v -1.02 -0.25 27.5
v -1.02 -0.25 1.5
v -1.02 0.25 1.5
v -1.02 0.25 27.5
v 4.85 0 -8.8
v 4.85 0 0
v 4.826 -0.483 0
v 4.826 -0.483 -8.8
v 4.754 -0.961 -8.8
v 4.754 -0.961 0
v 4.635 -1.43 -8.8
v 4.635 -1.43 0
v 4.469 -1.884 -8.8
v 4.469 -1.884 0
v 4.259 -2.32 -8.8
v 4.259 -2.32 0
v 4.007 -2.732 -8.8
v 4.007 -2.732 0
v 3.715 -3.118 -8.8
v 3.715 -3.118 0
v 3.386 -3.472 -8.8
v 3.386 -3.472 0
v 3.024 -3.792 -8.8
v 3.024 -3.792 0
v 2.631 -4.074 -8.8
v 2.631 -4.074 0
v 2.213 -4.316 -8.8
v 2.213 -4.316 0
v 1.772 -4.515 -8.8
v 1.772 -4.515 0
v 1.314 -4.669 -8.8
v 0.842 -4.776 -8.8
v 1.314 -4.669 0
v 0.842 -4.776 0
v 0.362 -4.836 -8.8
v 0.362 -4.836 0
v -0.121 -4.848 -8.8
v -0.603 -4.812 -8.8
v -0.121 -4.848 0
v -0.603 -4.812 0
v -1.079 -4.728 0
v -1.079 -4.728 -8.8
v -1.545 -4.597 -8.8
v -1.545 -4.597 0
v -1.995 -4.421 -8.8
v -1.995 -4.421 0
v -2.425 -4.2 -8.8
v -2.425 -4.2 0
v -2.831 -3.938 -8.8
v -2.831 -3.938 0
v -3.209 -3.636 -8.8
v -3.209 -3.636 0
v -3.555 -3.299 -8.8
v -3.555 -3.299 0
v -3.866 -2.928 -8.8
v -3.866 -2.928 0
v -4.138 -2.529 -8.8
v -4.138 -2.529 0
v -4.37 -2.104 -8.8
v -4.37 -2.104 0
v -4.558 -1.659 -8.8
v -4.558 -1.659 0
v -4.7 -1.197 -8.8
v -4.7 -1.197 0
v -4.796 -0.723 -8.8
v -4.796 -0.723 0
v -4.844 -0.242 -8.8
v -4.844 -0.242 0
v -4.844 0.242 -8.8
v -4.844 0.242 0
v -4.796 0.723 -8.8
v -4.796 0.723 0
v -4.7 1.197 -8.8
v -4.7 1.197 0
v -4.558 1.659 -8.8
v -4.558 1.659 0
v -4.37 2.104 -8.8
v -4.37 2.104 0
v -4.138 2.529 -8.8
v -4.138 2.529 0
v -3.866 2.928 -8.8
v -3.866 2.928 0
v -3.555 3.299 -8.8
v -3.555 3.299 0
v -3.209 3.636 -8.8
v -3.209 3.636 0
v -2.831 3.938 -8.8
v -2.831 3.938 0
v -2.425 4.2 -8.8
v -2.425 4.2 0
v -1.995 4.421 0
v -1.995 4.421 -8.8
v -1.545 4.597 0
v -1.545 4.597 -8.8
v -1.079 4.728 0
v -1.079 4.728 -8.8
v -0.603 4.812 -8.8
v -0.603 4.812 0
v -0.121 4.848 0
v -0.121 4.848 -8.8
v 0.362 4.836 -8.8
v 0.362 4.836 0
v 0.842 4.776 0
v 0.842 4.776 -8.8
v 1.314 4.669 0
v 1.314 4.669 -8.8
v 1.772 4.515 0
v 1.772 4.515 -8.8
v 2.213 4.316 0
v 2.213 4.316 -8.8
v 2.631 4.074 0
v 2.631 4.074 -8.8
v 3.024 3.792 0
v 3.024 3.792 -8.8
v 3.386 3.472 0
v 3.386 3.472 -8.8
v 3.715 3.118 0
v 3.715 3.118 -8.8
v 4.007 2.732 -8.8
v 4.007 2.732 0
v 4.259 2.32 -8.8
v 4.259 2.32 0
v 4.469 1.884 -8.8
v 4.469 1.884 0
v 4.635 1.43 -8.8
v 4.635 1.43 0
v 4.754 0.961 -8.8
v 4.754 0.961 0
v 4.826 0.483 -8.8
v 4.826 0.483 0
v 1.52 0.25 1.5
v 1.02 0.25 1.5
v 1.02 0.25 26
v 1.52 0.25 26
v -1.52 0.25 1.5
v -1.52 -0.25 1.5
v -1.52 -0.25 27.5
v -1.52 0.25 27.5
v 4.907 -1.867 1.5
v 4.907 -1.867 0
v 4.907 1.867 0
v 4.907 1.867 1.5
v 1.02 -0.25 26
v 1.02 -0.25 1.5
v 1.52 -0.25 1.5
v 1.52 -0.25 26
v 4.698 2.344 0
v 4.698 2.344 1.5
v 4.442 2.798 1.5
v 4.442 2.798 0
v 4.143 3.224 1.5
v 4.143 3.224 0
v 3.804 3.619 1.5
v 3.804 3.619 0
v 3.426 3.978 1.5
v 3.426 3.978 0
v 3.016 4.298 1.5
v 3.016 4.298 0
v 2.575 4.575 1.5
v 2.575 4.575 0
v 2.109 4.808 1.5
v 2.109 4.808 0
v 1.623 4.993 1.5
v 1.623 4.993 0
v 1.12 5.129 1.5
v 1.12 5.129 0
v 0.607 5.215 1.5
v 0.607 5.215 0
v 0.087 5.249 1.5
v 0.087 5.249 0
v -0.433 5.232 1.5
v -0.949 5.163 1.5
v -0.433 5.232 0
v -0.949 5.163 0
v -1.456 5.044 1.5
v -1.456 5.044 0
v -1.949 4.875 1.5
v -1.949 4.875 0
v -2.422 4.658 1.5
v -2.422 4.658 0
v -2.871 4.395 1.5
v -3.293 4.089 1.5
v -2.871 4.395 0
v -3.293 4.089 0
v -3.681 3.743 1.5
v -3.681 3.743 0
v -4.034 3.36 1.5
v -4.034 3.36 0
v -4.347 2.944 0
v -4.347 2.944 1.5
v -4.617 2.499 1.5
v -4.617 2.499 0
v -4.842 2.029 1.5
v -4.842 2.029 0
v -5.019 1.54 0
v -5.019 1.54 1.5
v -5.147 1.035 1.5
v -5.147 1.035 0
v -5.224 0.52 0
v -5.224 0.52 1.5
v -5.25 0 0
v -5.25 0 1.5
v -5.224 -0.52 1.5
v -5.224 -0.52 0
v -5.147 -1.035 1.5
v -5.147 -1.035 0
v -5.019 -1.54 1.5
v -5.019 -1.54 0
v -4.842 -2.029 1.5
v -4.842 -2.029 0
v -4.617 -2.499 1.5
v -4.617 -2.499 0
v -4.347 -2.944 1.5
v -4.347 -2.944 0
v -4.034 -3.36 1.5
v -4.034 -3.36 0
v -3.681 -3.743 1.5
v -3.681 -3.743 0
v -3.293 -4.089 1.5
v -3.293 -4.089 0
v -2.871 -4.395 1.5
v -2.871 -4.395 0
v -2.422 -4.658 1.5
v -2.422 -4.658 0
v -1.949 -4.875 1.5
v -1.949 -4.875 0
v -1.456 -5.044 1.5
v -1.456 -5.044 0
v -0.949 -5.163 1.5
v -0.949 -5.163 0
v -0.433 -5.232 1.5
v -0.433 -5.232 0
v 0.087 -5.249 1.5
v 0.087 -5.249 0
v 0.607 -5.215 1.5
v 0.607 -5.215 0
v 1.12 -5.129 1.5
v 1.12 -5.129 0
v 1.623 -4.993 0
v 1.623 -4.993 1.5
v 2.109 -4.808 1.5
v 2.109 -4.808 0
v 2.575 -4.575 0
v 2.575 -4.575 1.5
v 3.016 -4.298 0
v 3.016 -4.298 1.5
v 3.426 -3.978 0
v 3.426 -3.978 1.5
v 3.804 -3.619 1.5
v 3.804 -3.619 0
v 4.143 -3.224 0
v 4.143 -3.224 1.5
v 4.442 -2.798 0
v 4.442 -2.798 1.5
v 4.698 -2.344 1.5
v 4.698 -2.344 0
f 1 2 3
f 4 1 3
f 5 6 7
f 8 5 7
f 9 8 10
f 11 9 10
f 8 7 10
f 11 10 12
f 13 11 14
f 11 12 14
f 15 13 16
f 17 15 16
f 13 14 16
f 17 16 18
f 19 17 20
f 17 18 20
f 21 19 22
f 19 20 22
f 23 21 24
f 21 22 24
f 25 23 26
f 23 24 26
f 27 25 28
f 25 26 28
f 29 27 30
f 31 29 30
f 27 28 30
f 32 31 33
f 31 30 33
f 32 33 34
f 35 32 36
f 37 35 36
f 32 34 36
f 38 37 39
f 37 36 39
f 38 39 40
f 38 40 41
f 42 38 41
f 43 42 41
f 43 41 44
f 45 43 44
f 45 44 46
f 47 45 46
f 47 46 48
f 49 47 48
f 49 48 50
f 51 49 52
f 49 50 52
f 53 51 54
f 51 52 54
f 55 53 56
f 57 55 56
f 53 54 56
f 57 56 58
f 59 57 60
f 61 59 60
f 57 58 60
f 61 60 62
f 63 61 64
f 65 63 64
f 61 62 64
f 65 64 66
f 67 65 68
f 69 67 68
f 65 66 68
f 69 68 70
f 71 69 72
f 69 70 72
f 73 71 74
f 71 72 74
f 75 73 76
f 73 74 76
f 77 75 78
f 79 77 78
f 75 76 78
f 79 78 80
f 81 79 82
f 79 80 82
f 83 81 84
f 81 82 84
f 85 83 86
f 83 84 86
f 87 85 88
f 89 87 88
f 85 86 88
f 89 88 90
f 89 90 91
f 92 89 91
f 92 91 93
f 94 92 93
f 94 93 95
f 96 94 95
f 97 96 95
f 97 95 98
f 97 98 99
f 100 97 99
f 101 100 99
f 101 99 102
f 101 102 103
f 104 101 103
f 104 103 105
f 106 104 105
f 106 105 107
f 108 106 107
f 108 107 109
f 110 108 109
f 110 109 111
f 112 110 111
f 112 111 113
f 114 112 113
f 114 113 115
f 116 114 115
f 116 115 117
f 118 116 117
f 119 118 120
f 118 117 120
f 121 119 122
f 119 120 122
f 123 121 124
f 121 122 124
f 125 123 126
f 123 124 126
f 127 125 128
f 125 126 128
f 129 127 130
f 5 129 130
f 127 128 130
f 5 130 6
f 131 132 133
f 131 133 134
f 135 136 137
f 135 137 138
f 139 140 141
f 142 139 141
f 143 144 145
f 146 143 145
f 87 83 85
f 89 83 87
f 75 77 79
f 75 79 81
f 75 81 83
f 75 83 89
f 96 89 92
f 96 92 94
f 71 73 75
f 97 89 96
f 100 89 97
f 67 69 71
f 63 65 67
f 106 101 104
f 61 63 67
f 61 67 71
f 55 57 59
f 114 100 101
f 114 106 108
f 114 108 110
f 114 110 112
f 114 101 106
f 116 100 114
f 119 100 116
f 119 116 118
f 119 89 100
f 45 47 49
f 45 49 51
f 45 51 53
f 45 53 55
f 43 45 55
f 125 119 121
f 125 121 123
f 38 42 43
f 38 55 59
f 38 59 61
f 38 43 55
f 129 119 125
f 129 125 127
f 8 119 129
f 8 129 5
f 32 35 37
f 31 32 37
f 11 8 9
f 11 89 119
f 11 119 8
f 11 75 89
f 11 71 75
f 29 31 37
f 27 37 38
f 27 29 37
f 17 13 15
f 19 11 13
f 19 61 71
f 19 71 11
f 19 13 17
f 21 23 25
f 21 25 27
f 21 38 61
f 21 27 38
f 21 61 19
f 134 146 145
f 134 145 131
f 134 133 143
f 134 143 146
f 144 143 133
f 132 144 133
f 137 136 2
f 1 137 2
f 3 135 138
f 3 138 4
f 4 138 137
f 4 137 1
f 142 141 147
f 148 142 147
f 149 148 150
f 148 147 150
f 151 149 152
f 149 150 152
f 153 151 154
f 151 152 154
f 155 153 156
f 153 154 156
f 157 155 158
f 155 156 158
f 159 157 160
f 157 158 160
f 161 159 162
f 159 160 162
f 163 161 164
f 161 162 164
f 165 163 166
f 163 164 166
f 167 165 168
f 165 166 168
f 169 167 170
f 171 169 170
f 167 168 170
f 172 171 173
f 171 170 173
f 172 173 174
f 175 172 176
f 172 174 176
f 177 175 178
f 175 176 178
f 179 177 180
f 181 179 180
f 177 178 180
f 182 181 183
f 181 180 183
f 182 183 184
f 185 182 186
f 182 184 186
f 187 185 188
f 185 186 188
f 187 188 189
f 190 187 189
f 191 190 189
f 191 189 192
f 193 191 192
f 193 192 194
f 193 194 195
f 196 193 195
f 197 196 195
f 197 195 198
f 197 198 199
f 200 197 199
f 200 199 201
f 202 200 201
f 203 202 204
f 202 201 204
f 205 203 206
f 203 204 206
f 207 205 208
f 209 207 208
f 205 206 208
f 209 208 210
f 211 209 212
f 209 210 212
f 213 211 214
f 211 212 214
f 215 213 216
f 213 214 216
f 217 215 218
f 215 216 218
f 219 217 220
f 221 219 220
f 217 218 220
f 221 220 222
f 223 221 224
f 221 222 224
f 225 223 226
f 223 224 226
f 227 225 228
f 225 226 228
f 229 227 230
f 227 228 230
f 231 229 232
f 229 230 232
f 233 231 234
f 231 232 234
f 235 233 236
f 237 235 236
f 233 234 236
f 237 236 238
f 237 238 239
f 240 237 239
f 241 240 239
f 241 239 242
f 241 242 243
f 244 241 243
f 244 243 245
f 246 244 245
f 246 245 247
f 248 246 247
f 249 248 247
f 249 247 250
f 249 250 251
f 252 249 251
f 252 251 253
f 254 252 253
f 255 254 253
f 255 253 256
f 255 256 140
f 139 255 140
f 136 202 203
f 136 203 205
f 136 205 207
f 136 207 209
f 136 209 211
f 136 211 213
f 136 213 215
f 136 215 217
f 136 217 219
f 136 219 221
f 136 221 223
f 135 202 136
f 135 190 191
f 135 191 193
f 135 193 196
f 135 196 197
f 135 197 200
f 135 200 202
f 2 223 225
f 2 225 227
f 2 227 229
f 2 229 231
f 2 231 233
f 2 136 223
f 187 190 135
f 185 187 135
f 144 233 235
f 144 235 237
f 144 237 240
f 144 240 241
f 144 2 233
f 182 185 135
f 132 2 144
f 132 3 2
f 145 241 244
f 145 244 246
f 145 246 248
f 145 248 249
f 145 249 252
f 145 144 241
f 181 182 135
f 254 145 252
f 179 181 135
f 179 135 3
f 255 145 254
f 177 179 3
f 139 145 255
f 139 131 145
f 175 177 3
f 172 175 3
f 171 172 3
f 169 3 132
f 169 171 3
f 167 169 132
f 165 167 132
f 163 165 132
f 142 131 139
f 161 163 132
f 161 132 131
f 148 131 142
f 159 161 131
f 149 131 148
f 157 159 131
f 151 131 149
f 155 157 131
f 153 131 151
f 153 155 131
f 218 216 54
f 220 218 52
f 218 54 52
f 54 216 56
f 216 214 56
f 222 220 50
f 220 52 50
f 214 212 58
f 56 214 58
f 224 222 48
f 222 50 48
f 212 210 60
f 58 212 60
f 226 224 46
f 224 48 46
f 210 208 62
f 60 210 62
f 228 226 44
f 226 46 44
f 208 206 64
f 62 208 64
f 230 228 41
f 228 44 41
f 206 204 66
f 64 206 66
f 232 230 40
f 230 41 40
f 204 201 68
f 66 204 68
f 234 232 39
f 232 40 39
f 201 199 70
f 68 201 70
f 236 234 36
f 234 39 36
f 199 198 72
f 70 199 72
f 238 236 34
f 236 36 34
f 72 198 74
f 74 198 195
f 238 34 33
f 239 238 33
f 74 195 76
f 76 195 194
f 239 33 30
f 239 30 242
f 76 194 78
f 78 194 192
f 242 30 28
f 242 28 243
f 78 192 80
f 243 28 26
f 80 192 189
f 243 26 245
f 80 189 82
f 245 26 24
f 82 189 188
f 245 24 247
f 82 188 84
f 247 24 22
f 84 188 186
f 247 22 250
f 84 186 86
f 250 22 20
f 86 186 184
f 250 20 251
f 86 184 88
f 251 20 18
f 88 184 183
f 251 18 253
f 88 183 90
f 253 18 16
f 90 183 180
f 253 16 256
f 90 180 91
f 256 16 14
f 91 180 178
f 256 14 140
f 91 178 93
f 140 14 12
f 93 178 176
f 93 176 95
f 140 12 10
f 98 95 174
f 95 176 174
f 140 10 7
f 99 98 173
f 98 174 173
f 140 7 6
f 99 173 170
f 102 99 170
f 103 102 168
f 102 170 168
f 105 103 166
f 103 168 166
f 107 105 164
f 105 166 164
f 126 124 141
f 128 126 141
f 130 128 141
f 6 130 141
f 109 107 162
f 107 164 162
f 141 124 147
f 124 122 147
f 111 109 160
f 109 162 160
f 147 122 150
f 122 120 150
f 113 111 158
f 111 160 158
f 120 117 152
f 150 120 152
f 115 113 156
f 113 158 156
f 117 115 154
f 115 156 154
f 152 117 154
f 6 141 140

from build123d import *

# Parameters (mm, degrees)
PAD_DEPTH    = 1.5
SKETCH001_R  = 4.85
PAD001_DEPTH = 8.8
SKETCH002_W  = 0.5
SKETCH002_H  = 0.5
PAD002_DEPTH = 26
SKETCH003_W  = 0.5
SKETCH003_H  = 0.5
PAD003_DEPTH = 24.5


with BuildPart() as part:
    # Sketch → Pad (new body)
    with BuildSketch(Plane.XY):
        with BuildLine():
            ThreePointArc((4.906655, 1.867414), (-5.25, 0), (4.906655, -1.867414))
            Line((4.906655, -1.867414), (4.906655, 1.867414))
        make_face()
    extrude(amount=PAD_DEPTH)

    # Sketch001 (on Face3 of Pad) → Pad001 (join)
    with BuildSketch(Plane(origin=(0, 0, 0), x_dir=(1, 0, 0), z_dir=(0, 0, -1))):
        Circle(SKETCH001_R)
    extrude(amount=PAD001_DEPTH)

    # Sketch002 (on Face4 of Pad001) → Pad002 (join)
    with BuildSketch(Plane.XY.offset(1.5)):
        with Locations((-1.27, 0)):
            Rectangle(SKETCH002_W, SKETCH002_H)
    extrude(amount=PAD002_DEPTH)

    # Sketch003 (on Face4 of Pad001) → Pad003 (join)
    with BuildSketch(Plane.XY.offset(1.5)):
        with Locations((1.27, 0)):
            Rectangle(SKETCH003_W, SKETCH003_H)
    extrude(amount=PAD003_DEPTH)


solid = part.part
